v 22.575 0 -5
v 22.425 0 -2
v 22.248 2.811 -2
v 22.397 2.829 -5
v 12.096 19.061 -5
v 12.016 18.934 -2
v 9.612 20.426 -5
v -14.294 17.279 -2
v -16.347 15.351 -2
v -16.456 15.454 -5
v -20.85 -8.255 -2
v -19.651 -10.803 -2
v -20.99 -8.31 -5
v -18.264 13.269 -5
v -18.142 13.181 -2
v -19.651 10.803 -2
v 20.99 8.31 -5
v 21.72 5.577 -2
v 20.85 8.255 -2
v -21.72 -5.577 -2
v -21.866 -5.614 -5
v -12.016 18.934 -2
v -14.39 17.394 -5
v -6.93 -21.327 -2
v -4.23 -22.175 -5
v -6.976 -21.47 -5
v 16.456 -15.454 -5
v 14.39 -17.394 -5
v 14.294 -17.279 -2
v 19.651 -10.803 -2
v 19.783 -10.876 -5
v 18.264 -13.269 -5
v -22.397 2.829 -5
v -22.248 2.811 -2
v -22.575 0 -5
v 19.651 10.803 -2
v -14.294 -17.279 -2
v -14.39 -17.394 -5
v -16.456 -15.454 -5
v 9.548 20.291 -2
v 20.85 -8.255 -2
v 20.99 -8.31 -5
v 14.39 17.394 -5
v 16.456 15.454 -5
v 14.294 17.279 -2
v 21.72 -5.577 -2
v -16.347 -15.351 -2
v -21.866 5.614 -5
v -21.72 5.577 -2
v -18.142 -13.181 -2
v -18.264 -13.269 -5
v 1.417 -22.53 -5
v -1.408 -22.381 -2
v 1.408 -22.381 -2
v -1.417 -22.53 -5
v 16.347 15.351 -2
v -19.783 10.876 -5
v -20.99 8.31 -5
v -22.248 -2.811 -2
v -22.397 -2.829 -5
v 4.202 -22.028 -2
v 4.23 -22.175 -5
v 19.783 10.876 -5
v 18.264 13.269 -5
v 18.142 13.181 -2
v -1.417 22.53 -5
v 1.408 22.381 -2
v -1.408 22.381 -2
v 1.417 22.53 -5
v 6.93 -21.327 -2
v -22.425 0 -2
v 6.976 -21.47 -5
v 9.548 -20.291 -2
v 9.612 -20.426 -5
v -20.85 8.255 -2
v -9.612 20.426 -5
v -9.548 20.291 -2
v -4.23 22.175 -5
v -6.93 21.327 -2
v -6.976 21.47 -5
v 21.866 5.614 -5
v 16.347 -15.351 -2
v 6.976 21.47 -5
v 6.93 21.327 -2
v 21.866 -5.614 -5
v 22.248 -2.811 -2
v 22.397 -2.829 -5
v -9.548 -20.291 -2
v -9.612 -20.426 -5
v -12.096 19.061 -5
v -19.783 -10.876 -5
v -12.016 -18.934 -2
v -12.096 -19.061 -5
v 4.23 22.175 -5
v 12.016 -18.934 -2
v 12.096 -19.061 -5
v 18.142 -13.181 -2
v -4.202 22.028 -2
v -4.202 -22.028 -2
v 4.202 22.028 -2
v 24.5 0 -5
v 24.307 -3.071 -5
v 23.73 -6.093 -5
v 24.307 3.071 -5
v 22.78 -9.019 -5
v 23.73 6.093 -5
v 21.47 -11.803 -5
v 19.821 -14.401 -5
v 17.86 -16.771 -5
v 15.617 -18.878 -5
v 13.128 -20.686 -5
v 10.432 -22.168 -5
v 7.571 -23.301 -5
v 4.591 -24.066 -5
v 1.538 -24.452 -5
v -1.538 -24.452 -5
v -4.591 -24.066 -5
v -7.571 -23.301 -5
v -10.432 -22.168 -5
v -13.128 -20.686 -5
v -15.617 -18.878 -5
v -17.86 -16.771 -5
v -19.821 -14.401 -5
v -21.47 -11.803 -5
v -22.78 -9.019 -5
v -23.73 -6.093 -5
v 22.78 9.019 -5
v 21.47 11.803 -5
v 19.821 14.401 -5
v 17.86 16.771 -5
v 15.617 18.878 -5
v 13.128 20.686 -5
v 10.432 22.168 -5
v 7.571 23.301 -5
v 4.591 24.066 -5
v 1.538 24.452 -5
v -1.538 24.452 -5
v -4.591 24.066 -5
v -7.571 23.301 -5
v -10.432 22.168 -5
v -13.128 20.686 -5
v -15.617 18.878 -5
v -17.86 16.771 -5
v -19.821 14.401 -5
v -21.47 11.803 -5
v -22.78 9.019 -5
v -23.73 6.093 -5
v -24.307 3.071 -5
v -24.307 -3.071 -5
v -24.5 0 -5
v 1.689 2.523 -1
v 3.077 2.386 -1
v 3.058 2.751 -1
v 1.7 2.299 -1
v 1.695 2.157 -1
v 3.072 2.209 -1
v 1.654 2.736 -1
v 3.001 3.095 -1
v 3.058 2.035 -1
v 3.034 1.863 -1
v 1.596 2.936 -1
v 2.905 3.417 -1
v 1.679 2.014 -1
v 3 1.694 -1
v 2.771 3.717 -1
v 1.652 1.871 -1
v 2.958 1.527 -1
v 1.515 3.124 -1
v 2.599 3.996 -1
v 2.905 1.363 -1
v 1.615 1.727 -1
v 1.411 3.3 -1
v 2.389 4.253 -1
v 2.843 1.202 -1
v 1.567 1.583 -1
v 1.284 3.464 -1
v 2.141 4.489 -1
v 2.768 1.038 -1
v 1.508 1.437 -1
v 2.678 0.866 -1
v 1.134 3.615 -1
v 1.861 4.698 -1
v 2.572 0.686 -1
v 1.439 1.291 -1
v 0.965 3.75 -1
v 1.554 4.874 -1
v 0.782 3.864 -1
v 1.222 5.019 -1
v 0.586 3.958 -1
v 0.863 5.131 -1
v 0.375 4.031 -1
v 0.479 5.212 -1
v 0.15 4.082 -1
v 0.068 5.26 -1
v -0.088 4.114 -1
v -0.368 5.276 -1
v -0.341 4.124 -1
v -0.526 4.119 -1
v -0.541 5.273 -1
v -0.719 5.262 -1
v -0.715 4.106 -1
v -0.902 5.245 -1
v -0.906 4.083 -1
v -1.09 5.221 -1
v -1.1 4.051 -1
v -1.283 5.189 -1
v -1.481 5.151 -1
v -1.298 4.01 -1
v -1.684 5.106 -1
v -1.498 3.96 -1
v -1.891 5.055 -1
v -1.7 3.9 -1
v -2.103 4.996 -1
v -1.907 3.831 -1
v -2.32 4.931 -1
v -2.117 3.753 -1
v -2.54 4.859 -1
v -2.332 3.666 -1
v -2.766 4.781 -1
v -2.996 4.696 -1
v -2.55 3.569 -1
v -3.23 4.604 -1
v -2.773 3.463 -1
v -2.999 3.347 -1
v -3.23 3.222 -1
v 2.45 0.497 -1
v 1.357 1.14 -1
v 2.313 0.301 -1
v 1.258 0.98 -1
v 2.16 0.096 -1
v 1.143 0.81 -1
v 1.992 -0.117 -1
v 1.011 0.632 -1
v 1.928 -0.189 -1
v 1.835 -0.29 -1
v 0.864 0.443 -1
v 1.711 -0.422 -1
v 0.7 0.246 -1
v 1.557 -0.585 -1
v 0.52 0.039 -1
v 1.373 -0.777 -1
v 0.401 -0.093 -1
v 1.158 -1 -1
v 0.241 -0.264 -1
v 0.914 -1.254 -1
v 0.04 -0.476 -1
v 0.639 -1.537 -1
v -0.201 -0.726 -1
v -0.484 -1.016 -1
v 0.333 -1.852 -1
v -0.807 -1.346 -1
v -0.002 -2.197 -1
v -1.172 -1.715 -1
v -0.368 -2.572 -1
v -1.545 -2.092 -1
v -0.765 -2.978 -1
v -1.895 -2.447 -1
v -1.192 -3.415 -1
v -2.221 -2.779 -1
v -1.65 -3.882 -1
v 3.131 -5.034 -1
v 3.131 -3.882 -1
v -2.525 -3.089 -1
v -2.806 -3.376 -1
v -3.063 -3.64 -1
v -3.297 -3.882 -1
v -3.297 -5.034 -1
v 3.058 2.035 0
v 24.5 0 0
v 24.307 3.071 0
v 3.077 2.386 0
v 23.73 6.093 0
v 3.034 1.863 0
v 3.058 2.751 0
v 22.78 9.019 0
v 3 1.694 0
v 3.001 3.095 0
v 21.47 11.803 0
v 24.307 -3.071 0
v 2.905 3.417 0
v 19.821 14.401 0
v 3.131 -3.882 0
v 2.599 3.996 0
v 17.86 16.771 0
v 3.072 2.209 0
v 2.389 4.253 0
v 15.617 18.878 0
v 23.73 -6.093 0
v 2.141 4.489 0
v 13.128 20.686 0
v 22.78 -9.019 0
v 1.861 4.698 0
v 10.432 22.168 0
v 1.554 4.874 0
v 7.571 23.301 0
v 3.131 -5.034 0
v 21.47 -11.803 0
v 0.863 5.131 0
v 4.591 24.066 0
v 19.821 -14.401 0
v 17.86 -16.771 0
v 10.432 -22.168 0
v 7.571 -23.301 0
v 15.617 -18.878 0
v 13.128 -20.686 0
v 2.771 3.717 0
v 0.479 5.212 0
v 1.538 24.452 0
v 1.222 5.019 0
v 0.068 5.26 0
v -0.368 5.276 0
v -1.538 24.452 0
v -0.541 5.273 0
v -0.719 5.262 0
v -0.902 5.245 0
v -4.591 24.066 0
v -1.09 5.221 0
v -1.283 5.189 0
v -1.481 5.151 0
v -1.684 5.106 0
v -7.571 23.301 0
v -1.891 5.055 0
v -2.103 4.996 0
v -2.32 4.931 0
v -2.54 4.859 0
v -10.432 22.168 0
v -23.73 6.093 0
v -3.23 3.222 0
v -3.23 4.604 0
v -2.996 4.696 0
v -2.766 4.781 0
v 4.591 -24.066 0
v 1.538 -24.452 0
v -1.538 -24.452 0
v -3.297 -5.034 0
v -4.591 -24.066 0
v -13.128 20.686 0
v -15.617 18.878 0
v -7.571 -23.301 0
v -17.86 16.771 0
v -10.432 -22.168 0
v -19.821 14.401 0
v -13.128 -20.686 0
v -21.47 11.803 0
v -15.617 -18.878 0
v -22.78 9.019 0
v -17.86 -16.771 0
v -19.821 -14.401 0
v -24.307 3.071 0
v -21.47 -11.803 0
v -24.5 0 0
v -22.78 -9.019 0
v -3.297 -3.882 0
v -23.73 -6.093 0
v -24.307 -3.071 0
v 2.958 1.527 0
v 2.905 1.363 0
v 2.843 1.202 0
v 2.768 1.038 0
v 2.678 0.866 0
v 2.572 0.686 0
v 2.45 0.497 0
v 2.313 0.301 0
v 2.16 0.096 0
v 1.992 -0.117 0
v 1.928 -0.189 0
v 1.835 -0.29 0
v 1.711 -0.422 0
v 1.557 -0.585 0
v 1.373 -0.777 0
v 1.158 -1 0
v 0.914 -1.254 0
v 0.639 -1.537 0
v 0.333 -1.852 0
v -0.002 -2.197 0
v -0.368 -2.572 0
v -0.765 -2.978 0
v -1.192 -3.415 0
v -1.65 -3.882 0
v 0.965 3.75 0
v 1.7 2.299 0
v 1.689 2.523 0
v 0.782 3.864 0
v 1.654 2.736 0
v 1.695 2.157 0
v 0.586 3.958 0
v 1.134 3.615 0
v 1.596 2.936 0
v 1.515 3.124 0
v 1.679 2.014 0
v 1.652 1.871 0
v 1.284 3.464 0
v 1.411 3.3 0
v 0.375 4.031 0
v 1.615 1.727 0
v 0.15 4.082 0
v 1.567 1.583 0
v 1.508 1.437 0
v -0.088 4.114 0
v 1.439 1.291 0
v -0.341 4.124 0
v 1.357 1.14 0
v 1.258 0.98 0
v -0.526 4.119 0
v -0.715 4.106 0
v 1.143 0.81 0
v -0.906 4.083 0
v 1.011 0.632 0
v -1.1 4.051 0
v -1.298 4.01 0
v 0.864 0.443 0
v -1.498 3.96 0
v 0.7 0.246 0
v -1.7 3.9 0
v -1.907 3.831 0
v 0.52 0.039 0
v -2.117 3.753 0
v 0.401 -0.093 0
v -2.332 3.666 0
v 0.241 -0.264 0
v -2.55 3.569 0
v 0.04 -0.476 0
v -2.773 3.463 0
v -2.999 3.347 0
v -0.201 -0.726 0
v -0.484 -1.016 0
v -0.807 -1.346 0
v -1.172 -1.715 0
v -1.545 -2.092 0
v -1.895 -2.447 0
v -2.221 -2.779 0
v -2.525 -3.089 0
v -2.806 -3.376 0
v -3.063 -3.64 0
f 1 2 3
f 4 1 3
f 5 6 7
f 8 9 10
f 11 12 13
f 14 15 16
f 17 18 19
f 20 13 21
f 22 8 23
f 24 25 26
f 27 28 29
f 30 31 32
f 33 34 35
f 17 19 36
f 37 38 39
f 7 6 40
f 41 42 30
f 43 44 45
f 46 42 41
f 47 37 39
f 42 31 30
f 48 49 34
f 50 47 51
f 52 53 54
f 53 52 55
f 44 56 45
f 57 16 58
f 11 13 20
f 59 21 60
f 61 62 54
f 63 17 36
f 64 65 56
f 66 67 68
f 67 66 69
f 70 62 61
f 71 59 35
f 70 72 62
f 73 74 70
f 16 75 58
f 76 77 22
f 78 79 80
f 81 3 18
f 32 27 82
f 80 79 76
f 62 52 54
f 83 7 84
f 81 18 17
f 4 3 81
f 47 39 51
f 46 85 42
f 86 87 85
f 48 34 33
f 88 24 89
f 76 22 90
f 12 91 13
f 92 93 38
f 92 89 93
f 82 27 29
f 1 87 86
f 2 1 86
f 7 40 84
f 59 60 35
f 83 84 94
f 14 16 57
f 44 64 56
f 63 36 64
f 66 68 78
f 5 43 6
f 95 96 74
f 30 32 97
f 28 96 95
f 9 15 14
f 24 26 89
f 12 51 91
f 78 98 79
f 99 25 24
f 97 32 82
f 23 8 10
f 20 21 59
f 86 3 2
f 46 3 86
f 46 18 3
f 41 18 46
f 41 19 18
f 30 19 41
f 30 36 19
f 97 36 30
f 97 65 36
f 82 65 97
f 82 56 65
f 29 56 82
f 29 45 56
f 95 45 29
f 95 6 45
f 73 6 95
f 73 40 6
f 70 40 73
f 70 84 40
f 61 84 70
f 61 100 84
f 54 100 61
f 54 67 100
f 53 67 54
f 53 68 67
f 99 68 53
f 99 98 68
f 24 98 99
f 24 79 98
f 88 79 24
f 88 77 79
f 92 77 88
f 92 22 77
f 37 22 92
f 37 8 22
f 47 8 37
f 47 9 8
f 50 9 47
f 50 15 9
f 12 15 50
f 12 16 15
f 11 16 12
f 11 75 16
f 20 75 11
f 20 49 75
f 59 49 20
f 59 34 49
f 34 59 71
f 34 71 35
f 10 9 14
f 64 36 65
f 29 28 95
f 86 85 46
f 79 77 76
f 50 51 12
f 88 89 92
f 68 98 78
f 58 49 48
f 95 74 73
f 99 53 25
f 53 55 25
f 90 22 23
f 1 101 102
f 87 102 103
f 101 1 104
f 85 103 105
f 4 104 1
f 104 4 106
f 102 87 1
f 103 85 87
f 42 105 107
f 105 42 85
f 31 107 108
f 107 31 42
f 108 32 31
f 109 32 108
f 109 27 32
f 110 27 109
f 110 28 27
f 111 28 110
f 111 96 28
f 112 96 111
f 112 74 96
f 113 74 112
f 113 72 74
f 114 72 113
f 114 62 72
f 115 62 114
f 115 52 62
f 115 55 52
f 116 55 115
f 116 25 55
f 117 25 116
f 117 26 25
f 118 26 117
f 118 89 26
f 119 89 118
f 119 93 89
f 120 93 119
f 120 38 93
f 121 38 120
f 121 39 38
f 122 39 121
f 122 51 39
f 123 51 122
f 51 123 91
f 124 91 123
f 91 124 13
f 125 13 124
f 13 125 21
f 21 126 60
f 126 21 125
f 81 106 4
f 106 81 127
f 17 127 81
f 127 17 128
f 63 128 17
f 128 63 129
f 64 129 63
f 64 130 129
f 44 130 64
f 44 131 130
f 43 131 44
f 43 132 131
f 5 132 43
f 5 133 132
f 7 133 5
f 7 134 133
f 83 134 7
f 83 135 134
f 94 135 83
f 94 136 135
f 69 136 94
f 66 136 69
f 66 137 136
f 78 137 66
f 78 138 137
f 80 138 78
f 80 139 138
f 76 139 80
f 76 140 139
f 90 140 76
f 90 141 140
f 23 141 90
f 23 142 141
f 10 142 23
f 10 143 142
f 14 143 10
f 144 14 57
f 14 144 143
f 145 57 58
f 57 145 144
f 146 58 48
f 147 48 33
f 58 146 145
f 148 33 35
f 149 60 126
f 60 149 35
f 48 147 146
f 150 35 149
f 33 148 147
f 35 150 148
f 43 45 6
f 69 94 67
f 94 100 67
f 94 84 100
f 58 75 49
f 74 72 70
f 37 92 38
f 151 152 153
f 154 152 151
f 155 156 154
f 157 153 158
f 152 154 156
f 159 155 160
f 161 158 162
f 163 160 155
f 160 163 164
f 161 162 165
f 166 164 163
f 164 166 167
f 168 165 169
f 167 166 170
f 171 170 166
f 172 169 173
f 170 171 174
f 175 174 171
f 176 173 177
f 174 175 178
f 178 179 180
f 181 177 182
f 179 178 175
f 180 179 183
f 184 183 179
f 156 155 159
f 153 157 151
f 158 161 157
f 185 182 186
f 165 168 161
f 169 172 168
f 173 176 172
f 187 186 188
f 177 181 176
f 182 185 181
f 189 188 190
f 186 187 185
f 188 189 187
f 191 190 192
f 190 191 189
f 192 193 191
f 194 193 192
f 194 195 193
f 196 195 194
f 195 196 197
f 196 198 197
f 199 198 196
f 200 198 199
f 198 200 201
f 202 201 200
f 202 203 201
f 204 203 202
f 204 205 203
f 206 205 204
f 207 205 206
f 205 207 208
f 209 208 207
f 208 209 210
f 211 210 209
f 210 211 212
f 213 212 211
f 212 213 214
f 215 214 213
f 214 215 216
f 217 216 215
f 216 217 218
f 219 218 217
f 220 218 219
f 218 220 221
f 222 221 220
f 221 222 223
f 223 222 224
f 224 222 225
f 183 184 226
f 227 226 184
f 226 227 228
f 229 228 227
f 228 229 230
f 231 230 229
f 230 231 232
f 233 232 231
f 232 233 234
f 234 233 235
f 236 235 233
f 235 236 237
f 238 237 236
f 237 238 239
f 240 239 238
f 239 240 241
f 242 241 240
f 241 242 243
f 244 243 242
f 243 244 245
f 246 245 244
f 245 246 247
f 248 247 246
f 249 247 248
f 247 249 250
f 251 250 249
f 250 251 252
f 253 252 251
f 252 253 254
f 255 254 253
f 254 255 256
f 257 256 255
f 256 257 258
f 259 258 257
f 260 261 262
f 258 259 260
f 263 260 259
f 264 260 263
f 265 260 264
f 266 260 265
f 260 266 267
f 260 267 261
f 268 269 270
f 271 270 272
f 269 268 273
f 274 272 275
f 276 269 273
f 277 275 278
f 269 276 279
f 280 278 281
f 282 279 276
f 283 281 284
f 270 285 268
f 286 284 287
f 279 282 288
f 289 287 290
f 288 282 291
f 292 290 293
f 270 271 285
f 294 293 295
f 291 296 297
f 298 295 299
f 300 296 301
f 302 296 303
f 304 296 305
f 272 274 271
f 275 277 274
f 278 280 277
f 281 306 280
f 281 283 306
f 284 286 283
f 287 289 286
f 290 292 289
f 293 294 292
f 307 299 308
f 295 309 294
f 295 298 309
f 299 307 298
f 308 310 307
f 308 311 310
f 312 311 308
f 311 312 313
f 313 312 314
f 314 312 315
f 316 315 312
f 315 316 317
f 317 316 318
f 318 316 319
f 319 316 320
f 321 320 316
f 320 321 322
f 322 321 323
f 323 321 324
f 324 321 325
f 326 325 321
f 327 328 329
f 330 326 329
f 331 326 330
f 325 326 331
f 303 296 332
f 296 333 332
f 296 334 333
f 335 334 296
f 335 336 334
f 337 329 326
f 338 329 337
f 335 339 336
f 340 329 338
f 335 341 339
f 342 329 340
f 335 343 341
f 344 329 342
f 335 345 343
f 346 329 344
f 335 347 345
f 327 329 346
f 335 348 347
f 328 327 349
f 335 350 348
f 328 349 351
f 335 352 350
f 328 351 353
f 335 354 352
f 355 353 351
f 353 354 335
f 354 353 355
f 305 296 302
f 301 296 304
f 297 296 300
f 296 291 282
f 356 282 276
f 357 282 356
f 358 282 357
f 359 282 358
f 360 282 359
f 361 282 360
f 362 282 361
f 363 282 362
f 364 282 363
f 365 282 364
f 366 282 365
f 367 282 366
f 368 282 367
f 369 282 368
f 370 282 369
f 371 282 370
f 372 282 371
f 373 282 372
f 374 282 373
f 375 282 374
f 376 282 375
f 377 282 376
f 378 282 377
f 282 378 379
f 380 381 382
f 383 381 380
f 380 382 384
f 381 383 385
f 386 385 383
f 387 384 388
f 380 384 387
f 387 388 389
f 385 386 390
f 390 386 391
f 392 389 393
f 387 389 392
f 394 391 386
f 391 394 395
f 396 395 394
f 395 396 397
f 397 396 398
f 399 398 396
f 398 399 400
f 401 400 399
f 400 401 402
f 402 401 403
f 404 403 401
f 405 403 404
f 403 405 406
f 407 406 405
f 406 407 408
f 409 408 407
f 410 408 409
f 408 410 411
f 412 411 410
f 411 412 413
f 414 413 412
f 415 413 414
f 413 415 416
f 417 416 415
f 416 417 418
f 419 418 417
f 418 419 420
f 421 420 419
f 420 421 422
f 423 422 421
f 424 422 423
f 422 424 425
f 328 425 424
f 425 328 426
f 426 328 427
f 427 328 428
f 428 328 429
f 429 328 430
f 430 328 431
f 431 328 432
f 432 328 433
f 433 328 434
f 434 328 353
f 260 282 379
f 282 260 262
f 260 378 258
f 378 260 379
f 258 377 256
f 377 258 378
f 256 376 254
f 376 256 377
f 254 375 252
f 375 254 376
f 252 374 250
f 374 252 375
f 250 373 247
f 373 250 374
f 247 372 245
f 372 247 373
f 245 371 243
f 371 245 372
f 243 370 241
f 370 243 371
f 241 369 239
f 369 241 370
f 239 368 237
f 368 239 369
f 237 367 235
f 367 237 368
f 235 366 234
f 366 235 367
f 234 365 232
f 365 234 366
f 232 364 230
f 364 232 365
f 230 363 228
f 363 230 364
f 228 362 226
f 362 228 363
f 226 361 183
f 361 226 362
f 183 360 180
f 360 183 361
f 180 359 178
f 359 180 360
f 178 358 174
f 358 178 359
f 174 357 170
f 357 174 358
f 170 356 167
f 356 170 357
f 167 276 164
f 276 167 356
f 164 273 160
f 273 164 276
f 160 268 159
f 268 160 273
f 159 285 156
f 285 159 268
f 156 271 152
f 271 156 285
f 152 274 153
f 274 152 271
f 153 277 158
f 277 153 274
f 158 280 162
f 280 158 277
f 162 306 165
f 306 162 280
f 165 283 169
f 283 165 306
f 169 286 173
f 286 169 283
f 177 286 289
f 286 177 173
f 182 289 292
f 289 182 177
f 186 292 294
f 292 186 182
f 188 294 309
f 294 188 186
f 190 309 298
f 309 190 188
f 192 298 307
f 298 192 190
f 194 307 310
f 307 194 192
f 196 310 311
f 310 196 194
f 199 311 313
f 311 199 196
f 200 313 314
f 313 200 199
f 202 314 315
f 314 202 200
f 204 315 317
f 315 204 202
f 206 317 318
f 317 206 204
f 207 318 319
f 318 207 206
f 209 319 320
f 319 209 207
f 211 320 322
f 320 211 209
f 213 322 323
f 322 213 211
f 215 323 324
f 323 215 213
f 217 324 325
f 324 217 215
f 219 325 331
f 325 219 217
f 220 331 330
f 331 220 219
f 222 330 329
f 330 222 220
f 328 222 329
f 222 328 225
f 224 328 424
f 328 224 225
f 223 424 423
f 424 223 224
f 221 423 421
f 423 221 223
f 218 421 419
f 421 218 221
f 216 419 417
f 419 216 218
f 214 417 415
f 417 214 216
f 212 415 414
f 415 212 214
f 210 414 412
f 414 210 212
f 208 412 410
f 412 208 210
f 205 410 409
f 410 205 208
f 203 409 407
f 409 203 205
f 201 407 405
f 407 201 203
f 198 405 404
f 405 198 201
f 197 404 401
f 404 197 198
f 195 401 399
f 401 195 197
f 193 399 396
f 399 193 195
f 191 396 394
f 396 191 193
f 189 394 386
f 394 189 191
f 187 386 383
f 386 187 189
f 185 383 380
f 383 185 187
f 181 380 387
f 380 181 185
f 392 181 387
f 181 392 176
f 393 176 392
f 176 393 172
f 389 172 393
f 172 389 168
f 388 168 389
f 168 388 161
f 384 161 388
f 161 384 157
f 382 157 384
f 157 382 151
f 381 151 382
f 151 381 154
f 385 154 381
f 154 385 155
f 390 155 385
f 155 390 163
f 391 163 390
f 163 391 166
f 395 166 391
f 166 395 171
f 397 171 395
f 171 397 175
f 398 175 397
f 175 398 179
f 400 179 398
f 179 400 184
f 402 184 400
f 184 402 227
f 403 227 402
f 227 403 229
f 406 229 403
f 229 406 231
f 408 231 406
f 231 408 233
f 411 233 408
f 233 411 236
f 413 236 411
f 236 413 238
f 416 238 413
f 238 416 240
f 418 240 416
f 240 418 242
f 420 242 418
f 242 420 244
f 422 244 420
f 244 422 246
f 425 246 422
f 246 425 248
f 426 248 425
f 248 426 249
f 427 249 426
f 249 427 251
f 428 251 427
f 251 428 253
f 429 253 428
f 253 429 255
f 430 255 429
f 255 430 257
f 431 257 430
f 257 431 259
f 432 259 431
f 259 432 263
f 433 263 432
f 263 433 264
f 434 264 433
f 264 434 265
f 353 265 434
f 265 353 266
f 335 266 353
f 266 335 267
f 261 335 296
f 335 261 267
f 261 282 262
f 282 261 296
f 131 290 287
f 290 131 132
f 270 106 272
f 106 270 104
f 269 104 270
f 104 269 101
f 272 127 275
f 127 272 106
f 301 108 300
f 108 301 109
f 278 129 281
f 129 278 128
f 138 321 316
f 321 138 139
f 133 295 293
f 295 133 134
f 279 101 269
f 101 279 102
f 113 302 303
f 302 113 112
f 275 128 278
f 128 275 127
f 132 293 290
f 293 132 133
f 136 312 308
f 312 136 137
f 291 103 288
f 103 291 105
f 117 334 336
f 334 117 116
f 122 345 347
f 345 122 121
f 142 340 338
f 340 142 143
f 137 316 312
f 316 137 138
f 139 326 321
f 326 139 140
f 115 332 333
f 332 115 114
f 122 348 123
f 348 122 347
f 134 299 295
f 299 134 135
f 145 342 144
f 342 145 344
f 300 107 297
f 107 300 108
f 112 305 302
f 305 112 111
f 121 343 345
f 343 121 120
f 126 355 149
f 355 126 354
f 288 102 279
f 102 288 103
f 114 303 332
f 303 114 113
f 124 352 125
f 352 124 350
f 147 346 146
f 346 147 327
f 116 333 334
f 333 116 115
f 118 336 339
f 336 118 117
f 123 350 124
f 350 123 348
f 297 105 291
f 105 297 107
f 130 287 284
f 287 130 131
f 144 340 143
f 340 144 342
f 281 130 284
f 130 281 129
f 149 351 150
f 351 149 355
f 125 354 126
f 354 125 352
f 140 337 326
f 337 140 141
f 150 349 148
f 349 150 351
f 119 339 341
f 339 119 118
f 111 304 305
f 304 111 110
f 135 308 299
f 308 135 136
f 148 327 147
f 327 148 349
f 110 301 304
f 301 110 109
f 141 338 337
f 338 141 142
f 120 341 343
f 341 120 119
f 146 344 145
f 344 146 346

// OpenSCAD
$fn = 50;


difference() {
	union() {
		translate(v = [0, 0, -5.0000000000]) {
			cylinder(h = 5, r = 24.5000000000);
		}
	}
	union() {
		#translate(v = [0, 0, -5.0000000000]) {
			cylinder(h = 3, r1 = 22.5750000000, r2 = 22.4250000000);
		}
		translate(v = [0, 0, -1]) {
			linear_extrude(height = 1) {
				text(font = "Impact", halign = "center", size = 10, text = "2", valign = "center");
			}
		}
	}
}
